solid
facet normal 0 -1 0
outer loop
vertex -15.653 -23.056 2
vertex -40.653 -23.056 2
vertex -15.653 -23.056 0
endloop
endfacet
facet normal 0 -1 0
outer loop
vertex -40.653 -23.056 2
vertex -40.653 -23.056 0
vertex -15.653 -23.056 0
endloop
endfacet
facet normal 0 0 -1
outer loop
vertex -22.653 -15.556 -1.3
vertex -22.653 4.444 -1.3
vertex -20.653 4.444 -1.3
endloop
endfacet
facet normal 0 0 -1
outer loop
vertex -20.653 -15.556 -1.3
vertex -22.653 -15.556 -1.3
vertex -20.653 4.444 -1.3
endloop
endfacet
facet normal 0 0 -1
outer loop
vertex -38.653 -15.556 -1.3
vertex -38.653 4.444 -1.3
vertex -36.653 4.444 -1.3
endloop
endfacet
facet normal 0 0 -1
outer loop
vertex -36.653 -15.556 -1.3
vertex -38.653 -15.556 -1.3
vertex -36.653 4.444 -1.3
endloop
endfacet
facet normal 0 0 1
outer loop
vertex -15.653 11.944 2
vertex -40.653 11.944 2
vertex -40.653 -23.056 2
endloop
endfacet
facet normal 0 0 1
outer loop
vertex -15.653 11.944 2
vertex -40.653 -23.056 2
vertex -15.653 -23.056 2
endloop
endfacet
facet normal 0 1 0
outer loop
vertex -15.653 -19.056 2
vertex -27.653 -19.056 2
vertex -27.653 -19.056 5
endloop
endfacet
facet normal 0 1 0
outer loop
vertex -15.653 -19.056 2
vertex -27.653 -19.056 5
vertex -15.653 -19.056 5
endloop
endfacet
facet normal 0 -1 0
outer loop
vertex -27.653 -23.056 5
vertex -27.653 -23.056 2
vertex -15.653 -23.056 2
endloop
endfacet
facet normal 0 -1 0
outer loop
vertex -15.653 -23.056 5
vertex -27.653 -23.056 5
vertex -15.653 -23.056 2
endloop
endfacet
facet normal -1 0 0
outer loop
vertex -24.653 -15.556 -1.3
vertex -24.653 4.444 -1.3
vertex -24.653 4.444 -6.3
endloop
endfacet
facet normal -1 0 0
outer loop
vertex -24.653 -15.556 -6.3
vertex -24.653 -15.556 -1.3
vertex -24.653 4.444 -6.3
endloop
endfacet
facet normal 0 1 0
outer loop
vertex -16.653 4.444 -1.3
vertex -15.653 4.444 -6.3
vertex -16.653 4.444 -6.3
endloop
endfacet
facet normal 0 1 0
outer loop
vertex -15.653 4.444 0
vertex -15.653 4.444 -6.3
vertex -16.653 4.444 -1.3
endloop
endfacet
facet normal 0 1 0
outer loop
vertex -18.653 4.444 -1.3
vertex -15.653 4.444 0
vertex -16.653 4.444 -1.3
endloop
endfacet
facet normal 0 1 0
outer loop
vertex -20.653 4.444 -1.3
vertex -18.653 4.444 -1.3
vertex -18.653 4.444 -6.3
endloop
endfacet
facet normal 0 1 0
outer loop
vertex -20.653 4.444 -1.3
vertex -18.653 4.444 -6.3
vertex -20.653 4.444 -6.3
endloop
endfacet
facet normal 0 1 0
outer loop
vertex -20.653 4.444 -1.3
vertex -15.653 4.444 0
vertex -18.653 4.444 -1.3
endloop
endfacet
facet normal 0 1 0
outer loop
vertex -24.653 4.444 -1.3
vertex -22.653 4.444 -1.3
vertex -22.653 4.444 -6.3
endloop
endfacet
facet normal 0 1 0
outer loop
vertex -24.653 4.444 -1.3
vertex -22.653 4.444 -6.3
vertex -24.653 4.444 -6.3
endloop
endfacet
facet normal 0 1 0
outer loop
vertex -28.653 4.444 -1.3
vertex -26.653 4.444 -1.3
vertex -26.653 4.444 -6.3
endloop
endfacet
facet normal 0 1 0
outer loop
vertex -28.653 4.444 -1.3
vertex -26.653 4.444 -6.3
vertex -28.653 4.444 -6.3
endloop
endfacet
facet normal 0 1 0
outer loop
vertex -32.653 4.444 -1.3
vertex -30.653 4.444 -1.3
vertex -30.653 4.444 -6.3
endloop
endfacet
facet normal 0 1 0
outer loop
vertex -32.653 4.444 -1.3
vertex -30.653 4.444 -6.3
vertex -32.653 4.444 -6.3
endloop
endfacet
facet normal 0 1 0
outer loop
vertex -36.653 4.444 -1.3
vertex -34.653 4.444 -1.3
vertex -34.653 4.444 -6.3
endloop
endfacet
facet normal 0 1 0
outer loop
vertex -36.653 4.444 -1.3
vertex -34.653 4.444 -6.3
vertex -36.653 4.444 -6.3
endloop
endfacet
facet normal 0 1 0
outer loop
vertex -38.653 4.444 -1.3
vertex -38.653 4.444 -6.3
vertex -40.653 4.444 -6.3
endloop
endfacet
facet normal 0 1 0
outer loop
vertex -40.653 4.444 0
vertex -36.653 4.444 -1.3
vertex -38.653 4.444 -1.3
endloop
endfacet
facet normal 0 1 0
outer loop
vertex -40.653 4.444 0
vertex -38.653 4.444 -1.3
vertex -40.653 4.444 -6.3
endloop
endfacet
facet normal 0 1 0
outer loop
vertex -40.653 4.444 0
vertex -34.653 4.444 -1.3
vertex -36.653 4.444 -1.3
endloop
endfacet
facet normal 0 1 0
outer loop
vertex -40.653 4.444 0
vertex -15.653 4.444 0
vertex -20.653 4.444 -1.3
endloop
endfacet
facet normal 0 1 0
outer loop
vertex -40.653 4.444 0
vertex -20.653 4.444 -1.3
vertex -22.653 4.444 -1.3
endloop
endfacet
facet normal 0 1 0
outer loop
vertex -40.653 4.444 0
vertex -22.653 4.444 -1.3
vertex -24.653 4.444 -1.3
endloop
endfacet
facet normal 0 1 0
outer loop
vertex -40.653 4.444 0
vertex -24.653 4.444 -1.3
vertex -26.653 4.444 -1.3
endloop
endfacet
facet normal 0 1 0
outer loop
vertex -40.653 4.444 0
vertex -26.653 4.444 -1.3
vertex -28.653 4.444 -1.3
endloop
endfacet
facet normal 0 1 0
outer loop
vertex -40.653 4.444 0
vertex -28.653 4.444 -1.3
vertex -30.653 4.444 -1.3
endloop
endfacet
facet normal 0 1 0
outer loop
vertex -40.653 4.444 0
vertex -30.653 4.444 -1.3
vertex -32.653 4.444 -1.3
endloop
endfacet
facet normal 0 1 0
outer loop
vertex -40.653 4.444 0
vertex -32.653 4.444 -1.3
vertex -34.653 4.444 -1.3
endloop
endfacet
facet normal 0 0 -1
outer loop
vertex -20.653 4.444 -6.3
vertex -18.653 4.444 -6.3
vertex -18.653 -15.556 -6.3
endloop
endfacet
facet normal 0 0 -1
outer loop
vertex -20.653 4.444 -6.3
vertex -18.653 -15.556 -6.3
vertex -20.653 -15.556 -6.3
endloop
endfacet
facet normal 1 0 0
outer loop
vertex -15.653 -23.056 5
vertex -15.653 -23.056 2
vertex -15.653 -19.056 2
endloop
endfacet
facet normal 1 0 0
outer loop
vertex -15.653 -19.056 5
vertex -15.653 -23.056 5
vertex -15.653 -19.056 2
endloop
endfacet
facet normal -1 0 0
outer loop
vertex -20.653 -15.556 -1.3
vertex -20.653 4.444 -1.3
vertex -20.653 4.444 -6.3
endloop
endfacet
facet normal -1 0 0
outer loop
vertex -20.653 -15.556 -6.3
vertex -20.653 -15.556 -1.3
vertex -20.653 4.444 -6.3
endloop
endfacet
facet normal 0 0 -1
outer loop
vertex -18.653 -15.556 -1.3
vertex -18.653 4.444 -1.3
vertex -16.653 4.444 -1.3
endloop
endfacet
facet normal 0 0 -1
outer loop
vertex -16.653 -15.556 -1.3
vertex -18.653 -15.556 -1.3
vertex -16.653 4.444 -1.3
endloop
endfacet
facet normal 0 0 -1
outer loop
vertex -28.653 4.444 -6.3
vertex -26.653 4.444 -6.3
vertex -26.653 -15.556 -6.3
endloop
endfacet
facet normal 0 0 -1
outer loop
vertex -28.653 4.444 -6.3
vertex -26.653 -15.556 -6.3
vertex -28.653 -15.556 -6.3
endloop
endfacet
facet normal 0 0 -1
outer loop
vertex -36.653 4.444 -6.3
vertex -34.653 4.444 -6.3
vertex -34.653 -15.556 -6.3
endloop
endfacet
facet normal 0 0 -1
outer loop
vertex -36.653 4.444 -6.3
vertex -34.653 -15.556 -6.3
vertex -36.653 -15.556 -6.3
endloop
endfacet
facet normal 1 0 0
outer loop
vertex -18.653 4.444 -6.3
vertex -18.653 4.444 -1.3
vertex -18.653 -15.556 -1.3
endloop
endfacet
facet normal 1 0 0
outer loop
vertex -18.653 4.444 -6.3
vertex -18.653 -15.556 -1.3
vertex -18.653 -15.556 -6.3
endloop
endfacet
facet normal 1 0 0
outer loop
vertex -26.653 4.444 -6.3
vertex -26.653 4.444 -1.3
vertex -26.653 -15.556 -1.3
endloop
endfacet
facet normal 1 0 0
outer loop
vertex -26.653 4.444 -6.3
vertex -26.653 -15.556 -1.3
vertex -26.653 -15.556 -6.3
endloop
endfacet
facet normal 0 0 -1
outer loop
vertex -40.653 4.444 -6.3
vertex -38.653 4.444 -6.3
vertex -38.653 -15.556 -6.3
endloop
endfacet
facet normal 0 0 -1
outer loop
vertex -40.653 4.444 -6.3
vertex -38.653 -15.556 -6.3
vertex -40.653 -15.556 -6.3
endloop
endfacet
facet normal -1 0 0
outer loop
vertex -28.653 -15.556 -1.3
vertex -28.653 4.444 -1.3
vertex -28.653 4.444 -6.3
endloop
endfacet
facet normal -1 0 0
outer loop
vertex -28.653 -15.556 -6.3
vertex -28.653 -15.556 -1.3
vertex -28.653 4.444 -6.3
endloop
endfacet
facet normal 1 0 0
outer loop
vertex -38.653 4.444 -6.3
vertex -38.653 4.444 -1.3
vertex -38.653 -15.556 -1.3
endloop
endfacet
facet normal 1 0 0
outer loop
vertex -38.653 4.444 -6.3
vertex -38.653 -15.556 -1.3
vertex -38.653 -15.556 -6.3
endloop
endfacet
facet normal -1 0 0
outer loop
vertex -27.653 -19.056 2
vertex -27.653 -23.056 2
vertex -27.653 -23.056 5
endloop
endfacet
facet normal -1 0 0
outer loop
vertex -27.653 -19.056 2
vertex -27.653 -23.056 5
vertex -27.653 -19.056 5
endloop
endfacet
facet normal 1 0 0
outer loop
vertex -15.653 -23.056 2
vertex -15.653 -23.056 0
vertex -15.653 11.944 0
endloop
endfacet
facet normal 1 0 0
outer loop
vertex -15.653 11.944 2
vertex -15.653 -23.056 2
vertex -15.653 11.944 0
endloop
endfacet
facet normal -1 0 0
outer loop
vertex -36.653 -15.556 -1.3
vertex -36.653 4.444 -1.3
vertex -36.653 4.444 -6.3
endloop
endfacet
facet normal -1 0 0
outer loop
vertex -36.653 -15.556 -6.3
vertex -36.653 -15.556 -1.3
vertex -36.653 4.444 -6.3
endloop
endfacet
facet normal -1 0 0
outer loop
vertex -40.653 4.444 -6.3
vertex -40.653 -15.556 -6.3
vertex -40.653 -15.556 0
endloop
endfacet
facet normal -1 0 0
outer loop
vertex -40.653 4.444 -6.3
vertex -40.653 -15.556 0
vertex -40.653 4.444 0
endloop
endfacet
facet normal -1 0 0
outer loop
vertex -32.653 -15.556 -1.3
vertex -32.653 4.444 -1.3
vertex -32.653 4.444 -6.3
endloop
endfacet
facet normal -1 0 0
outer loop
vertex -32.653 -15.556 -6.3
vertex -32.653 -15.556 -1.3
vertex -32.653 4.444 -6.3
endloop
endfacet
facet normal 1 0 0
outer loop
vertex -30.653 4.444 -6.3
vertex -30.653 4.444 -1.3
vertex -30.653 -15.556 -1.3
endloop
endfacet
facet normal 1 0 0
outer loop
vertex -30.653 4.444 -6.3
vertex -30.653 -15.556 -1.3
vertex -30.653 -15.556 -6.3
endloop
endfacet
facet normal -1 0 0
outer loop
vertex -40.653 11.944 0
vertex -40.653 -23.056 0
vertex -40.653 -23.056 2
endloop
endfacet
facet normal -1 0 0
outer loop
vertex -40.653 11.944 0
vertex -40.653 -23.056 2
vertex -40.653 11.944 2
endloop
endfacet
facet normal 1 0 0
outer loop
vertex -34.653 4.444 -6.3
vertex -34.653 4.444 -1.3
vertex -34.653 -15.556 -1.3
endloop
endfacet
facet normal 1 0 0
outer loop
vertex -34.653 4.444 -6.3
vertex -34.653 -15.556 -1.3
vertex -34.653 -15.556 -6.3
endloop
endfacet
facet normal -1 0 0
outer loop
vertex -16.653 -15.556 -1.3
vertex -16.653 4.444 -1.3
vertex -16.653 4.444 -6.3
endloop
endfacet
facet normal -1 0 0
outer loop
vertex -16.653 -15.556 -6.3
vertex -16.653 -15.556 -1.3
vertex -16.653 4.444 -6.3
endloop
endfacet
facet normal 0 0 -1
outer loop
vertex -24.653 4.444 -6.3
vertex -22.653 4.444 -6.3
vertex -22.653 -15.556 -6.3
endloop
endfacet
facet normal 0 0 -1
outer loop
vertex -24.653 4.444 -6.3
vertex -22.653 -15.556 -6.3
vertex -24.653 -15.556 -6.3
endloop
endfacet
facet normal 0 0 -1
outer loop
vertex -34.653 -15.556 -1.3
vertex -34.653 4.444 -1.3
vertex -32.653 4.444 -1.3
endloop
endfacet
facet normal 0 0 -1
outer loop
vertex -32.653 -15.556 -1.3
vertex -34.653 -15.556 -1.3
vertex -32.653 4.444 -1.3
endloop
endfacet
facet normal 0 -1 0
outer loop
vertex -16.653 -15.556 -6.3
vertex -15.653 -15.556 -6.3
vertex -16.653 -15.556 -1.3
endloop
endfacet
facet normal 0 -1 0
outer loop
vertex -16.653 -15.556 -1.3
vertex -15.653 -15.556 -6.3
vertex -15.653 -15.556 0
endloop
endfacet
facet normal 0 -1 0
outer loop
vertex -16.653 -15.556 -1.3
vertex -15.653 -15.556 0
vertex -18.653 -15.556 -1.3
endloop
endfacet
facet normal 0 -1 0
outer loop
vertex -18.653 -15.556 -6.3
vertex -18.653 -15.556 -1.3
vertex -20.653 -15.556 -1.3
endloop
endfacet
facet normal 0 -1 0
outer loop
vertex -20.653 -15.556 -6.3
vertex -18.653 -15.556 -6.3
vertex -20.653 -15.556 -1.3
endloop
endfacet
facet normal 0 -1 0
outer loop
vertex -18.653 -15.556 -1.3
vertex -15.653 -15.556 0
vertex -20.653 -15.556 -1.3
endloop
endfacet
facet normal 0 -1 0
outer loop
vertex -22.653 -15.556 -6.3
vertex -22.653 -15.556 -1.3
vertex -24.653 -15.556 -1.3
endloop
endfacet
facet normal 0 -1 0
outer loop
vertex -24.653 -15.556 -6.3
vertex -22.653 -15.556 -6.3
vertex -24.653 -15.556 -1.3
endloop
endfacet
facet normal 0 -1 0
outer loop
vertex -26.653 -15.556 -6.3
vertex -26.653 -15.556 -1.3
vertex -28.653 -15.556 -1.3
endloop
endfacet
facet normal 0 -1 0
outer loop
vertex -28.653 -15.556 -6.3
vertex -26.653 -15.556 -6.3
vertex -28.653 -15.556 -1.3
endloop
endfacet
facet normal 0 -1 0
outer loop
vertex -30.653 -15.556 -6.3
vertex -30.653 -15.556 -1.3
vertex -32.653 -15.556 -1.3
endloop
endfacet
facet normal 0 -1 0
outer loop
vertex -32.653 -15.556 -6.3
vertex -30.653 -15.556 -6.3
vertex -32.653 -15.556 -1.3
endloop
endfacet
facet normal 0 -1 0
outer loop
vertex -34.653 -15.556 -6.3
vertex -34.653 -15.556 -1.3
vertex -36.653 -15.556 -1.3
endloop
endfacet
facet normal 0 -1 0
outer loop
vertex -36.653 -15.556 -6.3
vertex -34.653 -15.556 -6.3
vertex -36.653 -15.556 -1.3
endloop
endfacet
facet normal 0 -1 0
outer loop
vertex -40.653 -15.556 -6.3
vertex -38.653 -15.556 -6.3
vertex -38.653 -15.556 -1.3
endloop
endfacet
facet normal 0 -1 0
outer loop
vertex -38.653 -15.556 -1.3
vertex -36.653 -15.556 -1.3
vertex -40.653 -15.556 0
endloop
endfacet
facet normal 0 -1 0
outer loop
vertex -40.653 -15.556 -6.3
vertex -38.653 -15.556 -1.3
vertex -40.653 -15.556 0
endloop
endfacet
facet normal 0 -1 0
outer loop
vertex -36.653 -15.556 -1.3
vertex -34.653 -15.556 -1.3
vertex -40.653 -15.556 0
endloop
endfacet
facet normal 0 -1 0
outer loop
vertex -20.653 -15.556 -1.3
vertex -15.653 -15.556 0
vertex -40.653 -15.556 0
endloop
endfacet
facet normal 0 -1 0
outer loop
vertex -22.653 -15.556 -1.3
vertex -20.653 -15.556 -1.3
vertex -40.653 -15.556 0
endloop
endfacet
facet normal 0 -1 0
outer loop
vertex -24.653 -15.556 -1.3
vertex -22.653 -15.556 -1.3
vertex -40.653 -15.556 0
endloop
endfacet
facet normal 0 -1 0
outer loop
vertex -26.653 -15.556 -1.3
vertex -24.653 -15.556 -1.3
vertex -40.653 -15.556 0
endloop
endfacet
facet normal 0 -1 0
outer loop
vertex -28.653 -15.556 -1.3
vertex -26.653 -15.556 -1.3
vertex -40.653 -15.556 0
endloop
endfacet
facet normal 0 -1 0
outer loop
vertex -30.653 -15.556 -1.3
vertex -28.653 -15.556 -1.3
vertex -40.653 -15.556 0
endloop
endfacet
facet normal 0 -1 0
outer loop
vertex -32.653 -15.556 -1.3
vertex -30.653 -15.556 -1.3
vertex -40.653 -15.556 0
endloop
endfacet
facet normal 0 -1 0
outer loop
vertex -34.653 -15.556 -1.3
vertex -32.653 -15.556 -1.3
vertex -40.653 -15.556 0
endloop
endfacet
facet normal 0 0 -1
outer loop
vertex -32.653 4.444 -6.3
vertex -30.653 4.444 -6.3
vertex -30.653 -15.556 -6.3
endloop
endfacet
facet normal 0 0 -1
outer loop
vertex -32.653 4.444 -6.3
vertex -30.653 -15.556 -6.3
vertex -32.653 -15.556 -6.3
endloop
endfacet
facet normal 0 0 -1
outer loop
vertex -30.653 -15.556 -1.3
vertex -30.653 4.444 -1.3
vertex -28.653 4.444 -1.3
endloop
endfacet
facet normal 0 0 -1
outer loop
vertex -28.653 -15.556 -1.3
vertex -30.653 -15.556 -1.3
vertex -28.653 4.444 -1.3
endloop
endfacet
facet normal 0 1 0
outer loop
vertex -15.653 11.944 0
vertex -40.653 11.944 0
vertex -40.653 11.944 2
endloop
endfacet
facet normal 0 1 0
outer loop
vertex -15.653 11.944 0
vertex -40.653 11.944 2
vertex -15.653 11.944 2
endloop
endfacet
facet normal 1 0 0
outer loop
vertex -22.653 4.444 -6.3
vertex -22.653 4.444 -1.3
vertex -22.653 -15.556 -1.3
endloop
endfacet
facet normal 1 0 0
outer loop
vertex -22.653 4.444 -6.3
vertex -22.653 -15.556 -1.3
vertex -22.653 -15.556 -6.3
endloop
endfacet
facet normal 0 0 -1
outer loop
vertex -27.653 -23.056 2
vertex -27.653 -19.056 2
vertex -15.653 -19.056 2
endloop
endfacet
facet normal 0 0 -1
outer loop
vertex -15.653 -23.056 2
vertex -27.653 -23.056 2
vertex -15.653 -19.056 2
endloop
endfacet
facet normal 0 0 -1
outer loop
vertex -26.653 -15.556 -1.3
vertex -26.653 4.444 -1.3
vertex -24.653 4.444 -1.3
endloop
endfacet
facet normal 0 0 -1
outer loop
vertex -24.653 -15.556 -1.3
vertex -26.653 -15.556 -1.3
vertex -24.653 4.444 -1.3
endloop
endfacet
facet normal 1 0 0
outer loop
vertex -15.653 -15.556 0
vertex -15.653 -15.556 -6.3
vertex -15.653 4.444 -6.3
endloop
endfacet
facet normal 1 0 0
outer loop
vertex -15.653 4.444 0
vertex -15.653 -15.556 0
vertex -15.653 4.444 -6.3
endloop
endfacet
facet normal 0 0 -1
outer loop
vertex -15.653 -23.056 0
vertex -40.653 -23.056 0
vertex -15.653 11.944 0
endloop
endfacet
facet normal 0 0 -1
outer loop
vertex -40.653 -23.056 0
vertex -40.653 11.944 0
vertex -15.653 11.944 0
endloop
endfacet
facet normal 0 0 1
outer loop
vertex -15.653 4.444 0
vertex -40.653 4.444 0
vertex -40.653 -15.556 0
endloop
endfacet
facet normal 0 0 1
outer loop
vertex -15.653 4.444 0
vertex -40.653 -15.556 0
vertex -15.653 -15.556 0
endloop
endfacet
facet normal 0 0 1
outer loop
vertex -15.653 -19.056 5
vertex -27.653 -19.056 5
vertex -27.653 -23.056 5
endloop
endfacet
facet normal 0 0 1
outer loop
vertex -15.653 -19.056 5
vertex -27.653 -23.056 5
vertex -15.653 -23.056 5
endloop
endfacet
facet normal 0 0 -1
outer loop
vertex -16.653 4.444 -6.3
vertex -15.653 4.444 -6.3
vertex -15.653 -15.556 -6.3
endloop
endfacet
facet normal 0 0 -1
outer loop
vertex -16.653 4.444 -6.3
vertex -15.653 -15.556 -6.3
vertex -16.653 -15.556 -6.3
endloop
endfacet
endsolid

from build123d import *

# Parameters (mm, degrees)
CROQUIS1_W              = 25
CROQUIS1_H              = 35
SALIENTE_EXTRUIR1_DEPTH = 2
CROQUIS2_W              = 12
CROQUIS2_H              = 4
SALIENTE_EXTRUIR2_DEPTH = 3
CROQUIS4_W              = 25
CROQUIS4_H              = 20
SALIENTE_EXTRUIR3_DEPTH = 6.3
CROQUIS5_W              = 2
CROQUIS5_H              = 5
CORTAR_EXTRUIR1_DEPTH   = 20


# Read off the part's stored shape, not the designer's step: Partir1, Partir2
with BuildPart() as part:
    # Croquis1 → Saliente-Extruir1 (new body)
    with BuildSketch(Plane.XY):
        with Locations((-28.152566884, -5.555555556)):
            Rectangle(CROQUIS1_W, CROQUIS1_H)
    extrude(amount=SALIENTE_EXTRUIR1_DEPTH)

    # Croquis2 → Saliente-Extruir2 (add)
    with BuildSketch(Plane.XY.offset(2)):
        with Locations((-21.652566884, -21.055555556)):
            Rectangle(CROQUIS2_W, CROQUIS2_H)
    extrude(amount=SALIENTE_EXTRUIR2_DEPTH)

    # Croquis4 → Saliente-Extruir3 (add)
    with BuildSketch(Plane(origin=(0, 0, 0), x_dir=(-1, 0, 0), z_dir=(0, 0, -1))):
        with Locations((28.152566884, -5.555555556)):
            Rectangle(CROQUIS4_W, CROQUIS4_H)
    extrude(amount=SALIENTE_EXTRUIR3_DEPTH)

    # Croquis5 → Cortar-Extruir1 (cut)
    with BuildSketch(Plane(origin=(0, 4.444444444, 0), x_dir=(1, 0, 0), z_dir=(0, 1, 0))):
        with Locations((-17.652566884, 3.8)):
            Rectangle(CROQUIS5_W, CROQUIS5_H)
        with Locations((-21.652566884, 3.8)):
            Rectangle(CROQUIS5_W, CROQUIS5_H)
        with Locations((-25.652566884, 3.8)):
            Rectangle(CROQUIS5_W, CROQUIS5_H)
        with Locations((-29.652566884, 3.8)):
            Rectangle(CROQUIS5_W, CROQUIS5_H)
        with Locations((-33.652566884, 3.8)):
            Rectangle(CROQUIS5_W, CROQUIS5_H)
        with Locations((-37.652566884, 3.8)):
            Rectangle(CROQUIS5_W, CROQUIS5_H)
    extrude(amount=-CORTAR_EXTRUIR1_DEPTH, mode=Mode.SUBTRACT)


with BuildPart() as body_2:
    # Partir1: the piece on the far side of the plane
    add(part.part)
    split(bisect_by=Plane.XY.offset(2), keep=Keep.BOTTOM)


with BuildPart() as part_1:
    add(part.part)

    # Partir1
    split(bisect_by=Plane.XY.offset(2), keep=Keep.TOP)


with BuildPart() as body_3:
    # Partir2: the piece on the far side of the plane
    add(body_2.part)
    split(bisect_by=Plane.XY, keep=Keep.BOTTOM)


with BuildPart() as body_2_1:
    add(body_2.part)

    # Partir2
    split(bisect_by=Plane.XY, keep=Keep.TOP)


solid = Compound([part_1.part, body_3.part, body_2_1.part])
